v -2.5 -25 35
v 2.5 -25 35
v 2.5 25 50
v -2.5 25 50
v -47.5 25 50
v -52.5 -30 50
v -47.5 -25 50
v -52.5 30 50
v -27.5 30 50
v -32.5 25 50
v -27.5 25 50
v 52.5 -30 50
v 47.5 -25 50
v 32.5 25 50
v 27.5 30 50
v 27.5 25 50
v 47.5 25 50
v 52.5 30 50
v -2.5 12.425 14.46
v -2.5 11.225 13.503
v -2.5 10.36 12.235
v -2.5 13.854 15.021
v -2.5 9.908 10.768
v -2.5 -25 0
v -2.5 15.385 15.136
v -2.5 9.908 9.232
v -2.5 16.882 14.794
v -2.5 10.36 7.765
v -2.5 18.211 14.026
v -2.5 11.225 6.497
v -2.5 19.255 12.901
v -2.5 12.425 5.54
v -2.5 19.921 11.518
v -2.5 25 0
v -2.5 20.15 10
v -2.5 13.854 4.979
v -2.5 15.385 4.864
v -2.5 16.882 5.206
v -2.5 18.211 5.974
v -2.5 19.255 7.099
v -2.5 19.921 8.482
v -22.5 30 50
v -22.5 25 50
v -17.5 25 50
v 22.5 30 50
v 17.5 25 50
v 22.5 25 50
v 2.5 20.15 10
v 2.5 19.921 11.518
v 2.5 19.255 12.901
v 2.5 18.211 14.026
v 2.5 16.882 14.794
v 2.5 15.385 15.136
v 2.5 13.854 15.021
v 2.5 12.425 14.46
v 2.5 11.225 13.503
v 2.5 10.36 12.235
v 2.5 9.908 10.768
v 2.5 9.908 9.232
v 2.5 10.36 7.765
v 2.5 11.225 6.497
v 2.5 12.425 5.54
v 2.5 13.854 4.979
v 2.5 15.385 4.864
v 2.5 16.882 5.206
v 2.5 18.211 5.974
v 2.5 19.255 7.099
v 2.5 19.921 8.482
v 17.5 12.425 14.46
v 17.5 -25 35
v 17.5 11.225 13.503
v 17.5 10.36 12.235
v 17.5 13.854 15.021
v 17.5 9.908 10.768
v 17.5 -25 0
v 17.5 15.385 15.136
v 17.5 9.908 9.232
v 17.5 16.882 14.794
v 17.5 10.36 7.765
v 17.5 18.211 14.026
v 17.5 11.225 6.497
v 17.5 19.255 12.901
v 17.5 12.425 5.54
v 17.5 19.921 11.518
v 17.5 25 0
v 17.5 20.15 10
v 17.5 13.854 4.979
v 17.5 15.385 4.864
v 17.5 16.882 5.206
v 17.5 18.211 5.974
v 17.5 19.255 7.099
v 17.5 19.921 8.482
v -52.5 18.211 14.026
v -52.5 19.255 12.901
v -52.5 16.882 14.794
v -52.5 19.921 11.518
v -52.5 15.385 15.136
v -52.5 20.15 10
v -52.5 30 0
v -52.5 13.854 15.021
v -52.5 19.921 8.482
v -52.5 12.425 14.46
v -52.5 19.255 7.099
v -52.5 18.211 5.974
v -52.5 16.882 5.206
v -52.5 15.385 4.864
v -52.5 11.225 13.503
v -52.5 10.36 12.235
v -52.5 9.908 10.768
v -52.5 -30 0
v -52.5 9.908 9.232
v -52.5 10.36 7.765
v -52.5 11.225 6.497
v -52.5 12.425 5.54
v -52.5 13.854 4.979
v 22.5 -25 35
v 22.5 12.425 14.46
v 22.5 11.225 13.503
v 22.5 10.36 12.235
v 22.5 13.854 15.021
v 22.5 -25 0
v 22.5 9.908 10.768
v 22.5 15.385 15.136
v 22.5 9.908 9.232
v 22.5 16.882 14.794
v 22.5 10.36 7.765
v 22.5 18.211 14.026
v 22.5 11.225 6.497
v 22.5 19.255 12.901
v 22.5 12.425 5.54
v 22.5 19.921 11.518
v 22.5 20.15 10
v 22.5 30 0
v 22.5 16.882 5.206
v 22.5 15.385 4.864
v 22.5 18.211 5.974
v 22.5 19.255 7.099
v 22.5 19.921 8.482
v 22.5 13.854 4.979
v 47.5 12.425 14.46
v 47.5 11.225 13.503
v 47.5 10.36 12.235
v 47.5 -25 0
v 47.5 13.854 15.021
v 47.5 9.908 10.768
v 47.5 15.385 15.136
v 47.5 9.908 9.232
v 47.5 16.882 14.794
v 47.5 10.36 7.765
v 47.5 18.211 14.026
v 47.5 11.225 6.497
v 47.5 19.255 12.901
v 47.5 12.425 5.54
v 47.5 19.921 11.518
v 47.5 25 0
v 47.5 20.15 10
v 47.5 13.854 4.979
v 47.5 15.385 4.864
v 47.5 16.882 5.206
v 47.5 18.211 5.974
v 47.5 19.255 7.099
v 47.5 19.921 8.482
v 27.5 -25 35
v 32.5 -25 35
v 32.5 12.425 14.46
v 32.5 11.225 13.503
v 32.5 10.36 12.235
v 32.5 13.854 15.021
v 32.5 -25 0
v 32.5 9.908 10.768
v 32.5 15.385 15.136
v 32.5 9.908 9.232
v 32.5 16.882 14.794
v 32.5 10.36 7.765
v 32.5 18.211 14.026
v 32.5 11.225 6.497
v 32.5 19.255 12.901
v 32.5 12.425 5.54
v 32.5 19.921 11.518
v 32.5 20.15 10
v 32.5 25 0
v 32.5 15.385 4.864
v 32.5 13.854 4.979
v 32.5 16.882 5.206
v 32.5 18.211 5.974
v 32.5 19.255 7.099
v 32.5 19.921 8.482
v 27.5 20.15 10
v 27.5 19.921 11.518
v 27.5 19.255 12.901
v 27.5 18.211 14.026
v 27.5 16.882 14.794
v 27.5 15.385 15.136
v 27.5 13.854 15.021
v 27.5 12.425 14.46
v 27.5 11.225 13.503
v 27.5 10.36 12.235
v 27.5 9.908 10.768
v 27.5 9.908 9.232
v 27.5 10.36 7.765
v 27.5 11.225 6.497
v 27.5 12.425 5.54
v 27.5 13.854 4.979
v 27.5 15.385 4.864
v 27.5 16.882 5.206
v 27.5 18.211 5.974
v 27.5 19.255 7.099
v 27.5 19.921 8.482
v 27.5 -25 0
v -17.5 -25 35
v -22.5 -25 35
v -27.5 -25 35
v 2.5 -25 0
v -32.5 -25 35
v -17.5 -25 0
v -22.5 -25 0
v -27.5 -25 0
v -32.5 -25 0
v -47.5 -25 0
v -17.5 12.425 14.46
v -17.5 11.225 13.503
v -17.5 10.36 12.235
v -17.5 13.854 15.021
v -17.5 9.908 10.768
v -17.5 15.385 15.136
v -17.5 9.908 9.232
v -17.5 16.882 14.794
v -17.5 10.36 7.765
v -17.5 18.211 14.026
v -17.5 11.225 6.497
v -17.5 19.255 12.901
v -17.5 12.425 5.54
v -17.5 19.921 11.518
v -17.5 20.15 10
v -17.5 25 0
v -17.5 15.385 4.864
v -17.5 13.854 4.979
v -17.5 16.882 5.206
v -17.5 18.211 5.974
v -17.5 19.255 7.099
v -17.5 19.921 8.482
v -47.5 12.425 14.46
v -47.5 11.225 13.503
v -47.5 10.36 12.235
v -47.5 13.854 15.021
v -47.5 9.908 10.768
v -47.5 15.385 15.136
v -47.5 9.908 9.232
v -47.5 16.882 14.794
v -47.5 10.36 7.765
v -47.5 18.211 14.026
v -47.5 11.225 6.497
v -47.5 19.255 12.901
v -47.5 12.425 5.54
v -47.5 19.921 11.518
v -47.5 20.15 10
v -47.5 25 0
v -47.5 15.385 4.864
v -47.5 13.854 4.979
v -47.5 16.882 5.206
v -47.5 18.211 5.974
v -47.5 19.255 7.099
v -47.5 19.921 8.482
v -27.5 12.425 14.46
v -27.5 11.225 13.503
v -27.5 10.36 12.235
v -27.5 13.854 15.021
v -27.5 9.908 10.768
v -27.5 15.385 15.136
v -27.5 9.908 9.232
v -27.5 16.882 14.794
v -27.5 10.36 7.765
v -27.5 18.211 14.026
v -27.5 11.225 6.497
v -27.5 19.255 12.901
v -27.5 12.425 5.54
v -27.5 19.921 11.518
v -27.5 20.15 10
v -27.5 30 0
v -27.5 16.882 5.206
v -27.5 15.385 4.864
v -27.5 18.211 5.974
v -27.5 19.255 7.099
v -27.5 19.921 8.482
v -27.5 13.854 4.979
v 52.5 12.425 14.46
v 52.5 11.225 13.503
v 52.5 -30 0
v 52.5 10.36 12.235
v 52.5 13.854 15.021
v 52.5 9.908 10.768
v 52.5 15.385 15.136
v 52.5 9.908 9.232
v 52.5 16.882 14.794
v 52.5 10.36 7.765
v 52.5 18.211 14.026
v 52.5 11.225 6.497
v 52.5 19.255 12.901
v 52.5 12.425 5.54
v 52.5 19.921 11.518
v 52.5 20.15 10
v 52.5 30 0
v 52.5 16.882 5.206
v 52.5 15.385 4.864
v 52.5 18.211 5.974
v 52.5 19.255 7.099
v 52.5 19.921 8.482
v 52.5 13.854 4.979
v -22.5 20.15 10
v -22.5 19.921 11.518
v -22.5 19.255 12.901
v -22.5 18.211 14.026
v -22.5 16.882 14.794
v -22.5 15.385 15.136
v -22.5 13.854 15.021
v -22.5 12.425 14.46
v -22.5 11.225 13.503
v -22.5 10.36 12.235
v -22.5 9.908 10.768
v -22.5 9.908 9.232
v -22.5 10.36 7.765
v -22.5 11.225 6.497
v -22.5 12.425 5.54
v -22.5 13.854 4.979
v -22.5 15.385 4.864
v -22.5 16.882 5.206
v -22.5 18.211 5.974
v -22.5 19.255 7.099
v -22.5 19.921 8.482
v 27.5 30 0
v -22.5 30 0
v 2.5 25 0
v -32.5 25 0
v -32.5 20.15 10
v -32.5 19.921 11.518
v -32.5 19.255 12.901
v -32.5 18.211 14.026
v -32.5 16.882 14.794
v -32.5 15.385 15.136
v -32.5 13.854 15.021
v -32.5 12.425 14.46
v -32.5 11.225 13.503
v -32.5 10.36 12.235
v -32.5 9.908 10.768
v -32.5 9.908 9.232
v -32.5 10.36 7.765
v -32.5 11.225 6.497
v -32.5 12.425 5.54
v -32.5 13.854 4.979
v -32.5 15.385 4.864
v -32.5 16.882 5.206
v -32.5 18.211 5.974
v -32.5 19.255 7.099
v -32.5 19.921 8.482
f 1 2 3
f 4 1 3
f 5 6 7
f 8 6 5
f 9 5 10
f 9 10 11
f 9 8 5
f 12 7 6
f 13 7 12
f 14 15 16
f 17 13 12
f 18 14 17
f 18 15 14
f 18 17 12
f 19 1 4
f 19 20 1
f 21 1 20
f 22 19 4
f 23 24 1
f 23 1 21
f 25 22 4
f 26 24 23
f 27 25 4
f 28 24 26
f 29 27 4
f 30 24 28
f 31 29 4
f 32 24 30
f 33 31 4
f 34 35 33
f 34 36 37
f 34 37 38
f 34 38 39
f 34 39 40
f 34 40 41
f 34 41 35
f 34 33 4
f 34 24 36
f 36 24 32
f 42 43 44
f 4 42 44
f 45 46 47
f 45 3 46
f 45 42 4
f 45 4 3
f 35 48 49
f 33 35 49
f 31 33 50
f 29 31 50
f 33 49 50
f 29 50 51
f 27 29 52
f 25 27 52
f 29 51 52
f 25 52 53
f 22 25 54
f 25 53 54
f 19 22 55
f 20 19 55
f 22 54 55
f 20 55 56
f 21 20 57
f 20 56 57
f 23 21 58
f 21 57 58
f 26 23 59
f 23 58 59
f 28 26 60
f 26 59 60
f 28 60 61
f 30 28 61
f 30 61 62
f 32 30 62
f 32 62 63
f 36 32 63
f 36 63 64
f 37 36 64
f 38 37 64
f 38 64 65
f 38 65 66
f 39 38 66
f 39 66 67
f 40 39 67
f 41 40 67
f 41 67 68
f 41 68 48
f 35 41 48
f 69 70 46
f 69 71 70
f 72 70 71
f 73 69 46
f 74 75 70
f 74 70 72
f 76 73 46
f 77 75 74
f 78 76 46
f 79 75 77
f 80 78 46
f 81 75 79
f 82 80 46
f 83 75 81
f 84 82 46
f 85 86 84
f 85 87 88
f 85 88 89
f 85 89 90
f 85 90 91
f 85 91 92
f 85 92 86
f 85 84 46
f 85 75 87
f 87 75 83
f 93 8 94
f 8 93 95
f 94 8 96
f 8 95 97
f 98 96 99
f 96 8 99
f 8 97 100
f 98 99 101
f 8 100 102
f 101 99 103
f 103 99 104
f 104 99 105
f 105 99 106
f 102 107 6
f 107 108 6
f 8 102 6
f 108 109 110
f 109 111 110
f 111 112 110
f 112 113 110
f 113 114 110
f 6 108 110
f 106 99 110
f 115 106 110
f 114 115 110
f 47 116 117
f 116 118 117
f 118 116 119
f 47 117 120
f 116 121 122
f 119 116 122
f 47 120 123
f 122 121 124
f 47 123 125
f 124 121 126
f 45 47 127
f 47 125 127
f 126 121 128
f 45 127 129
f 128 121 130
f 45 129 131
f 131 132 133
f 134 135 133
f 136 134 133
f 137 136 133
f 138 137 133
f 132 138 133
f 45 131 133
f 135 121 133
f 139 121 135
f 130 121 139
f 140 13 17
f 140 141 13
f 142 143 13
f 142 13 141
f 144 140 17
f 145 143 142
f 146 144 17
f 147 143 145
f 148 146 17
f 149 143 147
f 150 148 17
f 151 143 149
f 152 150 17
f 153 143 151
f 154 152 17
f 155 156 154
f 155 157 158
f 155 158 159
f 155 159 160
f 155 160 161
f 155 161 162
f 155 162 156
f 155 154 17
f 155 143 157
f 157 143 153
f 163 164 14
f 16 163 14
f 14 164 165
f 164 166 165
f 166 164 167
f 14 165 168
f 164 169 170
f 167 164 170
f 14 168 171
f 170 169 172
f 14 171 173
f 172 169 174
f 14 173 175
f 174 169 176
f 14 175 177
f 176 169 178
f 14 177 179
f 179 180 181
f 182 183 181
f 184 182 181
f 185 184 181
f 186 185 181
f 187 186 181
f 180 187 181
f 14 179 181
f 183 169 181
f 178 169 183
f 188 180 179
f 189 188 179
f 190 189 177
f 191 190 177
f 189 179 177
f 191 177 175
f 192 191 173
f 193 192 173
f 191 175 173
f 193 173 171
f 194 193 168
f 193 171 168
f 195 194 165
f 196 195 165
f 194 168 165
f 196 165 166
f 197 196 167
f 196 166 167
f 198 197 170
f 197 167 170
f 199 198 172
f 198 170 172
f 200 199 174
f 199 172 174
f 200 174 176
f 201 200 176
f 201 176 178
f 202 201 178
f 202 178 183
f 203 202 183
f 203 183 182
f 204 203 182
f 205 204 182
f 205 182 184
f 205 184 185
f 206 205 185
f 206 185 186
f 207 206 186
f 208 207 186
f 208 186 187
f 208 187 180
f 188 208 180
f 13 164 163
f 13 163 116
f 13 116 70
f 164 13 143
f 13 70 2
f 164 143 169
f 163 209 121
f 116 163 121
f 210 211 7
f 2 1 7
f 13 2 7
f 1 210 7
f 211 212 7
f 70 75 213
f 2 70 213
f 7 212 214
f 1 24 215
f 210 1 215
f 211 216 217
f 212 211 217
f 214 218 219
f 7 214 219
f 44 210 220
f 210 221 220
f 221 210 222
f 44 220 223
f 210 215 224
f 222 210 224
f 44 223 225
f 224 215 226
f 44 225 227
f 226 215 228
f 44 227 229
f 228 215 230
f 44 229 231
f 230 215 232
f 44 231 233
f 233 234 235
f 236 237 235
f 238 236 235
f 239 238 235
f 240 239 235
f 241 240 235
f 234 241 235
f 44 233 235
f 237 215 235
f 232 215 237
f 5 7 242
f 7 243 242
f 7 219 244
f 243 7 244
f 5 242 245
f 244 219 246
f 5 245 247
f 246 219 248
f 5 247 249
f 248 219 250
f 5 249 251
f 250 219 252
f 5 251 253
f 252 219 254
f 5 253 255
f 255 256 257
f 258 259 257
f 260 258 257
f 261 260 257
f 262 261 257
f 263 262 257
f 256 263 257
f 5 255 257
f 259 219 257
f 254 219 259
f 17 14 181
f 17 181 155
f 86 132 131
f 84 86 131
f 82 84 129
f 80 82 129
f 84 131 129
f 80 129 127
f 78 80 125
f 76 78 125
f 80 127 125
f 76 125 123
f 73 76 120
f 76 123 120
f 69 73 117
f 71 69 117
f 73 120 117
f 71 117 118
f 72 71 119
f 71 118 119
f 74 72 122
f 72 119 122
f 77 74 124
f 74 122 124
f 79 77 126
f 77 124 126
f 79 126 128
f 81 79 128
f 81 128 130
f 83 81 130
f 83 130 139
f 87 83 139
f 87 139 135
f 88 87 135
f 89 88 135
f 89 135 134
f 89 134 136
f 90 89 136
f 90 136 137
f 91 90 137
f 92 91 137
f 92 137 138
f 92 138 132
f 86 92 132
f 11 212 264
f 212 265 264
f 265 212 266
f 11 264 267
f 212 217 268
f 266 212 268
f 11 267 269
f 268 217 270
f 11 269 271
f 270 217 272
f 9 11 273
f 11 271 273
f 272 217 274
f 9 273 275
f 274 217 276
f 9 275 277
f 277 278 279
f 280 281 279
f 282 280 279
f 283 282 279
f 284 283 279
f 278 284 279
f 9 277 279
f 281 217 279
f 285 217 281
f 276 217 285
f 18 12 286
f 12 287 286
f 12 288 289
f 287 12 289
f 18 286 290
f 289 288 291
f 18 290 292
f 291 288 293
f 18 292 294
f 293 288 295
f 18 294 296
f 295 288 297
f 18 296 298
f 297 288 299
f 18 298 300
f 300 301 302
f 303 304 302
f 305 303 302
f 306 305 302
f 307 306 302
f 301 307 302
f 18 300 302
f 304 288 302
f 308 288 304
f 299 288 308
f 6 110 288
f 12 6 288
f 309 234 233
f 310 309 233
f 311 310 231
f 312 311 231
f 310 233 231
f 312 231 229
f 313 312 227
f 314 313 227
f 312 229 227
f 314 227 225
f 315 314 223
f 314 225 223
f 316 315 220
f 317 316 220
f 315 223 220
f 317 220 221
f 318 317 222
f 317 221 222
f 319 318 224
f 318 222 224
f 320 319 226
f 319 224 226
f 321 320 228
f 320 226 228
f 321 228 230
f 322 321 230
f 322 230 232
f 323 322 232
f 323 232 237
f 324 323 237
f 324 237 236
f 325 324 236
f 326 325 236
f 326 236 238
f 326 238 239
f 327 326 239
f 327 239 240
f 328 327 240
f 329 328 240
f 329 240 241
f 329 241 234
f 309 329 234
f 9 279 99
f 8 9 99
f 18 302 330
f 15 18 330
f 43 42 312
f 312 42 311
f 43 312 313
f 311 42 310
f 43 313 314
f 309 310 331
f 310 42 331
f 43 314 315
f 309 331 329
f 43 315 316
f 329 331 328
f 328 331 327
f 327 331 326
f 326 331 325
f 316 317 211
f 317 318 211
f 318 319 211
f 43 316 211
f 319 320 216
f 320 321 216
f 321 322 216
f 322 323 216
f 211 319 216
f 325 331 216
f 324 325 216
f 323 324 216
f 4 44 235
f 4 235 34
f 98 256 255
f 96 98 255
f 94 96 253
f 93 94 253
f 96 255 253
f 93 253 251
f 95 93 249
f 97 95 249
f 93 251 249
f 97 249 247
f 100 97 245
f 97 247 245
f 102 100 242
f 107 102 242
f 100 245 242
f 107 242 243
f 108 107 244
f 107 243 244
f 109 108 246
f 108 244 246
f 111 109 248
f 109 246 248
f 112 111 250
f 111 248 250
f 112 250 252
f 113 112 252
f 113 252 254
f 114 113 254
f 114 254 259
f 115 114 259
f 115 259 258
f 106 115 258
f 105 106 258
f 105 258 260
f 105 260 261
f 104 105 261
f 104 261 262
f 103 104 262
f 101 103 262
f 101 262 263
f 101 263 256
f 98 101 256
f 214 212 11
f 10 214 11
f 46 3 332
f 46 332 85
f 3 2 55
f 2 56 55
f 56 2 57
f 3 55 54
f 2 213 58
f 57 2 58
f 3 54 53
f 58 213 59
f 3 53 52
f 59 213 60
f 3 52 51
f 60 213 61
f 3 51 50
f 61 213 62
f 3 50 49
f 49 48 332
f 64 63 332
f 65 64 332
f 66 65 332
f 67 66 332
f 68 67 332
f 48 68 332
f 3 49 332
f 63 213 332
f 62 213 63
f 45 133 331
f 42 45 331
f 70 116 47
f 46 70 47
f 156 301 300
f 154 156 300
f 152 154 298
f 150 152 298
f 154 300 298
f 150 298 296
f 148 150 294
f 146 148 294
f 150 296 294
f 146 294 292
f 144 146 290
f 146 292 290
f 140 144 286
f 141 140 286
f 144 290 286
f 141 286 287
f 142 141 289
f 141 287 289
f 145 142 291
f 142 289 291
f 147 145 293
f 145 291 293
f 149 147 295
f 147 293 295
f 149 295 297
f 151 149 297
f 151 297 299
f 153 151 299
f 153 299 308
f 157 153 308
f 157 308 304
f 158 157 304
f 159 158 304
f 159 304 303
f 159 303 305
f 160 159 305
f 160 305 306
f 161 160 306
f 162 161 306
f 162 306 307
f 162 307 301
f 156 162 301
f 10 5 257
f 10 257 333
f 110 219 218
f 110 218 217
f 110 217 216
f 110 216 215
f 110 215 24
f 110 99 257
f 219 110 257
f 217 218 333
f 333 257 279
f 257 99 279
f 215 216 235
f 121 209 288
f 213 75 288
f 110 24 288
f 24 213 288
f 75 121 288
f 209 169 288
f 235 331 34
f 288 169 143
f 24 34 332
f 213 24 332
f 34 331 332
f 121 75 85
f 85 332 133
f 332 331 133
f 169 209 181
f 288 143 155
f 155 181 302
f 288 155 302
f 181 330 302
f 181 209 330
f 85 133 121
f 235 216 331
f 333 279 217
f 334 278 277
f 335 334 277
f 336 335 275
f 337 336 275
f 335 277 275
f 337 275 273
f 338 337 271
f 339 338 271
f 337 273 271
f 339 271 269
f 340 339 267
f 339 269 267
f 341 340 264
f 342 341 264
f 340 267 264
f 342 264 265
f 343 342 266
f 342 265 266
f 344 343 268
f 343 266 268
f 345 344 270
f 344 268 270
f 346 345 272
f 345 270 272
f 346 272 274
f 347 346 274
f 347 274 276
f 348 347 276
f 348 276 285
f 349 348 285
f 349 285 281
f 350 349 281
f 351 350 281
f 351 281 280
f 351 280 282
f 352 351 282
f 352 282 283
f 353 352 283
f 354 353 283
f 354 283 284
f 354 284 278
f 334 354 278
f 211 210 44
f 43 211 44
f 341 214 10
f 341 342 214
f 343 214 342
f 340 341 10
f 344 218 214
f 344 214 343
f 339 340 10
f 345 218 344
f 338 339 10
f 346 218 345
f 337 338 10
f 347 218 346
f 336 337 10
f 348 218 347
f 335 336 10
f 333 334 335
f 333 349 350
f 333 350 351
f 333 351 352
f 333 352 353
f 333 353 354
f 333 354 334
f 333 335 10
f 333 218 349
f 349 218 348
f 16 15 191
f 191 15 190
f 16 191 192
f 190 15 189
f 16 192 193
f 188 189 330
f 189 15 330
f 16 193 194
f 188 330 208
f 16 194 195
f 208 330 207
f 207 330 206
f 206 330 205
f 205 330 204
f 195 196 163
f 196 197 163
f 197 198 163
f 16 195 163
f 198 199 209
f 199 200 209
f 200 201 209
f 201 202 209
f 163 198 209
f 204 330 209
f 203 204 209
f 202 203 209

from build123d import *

# Parameters (mm, degrees)
F0_W     = 15
F0_H     = 50
F1_DEPTH = 50
F2_R     = 5.15
F3_DEPTH = 105.001
F5_DEPTH = 75


with BuildPart() as f1:
    # F0 (on Top) → F1 (new body)
    with BuildSketch(Plane.XY):
        Polygon((52.5, -30), (52.5, 30), (27.5, 30), (27.5, 25), (27.5, -25), (22.5, -25), (22.5, 25), (22.5, 30), (-22.5, 30), (-22.5, 25), (-22.5, -25), (-27.5, -25), (-27.5, 25), (-27.5, 30), (-52.5, 30), (-52.5, -30), align=None)
        with Locations((-40, 0)):
            Rectangle(F0_W, F0_H, mode=Mode.SUBTRACT)
        with Locations((-10, 0)):
            Rectangle(F0_W, F0_H, mode=Mode.SUBTRACT)
        with Locations((10, 0)):
            Rectangle(F0_W, F0_H, mode=Mode.SUBTRACT)
        with Locations((40, 0)):
            Rectangle(F0_W, F0_H, mode=Mode.SUBTRACT)
    extrude(amount=F1_DEPTH)

    # F2 (on face) → F3 (cut, through all)
    with BuildSketch(Plane.YZ.offset(52.5)):
        with Locations((15, 10)):
            Circle(F2_R)
    extrude(amount=-F3_DEPTH, mode=Mode.SUBTRACT)

    # F4 (on face) → F5 (cut)
    with BuildSketch(Plane.YZ.offset(32.5)):
        Polygon((-25, 35), (25, 50), (-25, 50), align=None)
    extrude(amount=-F5_DEPTH, mode=Mode.SUBTRACT)


solid = f1.part
